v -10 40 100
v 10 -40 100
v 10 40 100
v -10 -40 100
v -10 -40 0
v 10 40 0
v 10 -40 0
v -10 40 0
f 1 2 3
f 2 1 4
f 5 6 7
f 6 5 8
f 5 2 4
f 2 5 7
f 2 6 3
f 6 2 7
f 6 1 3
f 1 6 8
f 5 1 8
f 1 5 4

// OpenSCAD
$fn = 64;

// 20x80 aluminium extrusion profile (simplified as a solid rectangular prism)
// Cross-section: 20.0mm x 80.0mm
// Length: 100mm

w = 20.0;
h = 80.0;
len = 100.0;

color([0.75, 0.75, 0.78])
translate([-w/2, -h/2, 0])
cube([w, h, len], center=false);
